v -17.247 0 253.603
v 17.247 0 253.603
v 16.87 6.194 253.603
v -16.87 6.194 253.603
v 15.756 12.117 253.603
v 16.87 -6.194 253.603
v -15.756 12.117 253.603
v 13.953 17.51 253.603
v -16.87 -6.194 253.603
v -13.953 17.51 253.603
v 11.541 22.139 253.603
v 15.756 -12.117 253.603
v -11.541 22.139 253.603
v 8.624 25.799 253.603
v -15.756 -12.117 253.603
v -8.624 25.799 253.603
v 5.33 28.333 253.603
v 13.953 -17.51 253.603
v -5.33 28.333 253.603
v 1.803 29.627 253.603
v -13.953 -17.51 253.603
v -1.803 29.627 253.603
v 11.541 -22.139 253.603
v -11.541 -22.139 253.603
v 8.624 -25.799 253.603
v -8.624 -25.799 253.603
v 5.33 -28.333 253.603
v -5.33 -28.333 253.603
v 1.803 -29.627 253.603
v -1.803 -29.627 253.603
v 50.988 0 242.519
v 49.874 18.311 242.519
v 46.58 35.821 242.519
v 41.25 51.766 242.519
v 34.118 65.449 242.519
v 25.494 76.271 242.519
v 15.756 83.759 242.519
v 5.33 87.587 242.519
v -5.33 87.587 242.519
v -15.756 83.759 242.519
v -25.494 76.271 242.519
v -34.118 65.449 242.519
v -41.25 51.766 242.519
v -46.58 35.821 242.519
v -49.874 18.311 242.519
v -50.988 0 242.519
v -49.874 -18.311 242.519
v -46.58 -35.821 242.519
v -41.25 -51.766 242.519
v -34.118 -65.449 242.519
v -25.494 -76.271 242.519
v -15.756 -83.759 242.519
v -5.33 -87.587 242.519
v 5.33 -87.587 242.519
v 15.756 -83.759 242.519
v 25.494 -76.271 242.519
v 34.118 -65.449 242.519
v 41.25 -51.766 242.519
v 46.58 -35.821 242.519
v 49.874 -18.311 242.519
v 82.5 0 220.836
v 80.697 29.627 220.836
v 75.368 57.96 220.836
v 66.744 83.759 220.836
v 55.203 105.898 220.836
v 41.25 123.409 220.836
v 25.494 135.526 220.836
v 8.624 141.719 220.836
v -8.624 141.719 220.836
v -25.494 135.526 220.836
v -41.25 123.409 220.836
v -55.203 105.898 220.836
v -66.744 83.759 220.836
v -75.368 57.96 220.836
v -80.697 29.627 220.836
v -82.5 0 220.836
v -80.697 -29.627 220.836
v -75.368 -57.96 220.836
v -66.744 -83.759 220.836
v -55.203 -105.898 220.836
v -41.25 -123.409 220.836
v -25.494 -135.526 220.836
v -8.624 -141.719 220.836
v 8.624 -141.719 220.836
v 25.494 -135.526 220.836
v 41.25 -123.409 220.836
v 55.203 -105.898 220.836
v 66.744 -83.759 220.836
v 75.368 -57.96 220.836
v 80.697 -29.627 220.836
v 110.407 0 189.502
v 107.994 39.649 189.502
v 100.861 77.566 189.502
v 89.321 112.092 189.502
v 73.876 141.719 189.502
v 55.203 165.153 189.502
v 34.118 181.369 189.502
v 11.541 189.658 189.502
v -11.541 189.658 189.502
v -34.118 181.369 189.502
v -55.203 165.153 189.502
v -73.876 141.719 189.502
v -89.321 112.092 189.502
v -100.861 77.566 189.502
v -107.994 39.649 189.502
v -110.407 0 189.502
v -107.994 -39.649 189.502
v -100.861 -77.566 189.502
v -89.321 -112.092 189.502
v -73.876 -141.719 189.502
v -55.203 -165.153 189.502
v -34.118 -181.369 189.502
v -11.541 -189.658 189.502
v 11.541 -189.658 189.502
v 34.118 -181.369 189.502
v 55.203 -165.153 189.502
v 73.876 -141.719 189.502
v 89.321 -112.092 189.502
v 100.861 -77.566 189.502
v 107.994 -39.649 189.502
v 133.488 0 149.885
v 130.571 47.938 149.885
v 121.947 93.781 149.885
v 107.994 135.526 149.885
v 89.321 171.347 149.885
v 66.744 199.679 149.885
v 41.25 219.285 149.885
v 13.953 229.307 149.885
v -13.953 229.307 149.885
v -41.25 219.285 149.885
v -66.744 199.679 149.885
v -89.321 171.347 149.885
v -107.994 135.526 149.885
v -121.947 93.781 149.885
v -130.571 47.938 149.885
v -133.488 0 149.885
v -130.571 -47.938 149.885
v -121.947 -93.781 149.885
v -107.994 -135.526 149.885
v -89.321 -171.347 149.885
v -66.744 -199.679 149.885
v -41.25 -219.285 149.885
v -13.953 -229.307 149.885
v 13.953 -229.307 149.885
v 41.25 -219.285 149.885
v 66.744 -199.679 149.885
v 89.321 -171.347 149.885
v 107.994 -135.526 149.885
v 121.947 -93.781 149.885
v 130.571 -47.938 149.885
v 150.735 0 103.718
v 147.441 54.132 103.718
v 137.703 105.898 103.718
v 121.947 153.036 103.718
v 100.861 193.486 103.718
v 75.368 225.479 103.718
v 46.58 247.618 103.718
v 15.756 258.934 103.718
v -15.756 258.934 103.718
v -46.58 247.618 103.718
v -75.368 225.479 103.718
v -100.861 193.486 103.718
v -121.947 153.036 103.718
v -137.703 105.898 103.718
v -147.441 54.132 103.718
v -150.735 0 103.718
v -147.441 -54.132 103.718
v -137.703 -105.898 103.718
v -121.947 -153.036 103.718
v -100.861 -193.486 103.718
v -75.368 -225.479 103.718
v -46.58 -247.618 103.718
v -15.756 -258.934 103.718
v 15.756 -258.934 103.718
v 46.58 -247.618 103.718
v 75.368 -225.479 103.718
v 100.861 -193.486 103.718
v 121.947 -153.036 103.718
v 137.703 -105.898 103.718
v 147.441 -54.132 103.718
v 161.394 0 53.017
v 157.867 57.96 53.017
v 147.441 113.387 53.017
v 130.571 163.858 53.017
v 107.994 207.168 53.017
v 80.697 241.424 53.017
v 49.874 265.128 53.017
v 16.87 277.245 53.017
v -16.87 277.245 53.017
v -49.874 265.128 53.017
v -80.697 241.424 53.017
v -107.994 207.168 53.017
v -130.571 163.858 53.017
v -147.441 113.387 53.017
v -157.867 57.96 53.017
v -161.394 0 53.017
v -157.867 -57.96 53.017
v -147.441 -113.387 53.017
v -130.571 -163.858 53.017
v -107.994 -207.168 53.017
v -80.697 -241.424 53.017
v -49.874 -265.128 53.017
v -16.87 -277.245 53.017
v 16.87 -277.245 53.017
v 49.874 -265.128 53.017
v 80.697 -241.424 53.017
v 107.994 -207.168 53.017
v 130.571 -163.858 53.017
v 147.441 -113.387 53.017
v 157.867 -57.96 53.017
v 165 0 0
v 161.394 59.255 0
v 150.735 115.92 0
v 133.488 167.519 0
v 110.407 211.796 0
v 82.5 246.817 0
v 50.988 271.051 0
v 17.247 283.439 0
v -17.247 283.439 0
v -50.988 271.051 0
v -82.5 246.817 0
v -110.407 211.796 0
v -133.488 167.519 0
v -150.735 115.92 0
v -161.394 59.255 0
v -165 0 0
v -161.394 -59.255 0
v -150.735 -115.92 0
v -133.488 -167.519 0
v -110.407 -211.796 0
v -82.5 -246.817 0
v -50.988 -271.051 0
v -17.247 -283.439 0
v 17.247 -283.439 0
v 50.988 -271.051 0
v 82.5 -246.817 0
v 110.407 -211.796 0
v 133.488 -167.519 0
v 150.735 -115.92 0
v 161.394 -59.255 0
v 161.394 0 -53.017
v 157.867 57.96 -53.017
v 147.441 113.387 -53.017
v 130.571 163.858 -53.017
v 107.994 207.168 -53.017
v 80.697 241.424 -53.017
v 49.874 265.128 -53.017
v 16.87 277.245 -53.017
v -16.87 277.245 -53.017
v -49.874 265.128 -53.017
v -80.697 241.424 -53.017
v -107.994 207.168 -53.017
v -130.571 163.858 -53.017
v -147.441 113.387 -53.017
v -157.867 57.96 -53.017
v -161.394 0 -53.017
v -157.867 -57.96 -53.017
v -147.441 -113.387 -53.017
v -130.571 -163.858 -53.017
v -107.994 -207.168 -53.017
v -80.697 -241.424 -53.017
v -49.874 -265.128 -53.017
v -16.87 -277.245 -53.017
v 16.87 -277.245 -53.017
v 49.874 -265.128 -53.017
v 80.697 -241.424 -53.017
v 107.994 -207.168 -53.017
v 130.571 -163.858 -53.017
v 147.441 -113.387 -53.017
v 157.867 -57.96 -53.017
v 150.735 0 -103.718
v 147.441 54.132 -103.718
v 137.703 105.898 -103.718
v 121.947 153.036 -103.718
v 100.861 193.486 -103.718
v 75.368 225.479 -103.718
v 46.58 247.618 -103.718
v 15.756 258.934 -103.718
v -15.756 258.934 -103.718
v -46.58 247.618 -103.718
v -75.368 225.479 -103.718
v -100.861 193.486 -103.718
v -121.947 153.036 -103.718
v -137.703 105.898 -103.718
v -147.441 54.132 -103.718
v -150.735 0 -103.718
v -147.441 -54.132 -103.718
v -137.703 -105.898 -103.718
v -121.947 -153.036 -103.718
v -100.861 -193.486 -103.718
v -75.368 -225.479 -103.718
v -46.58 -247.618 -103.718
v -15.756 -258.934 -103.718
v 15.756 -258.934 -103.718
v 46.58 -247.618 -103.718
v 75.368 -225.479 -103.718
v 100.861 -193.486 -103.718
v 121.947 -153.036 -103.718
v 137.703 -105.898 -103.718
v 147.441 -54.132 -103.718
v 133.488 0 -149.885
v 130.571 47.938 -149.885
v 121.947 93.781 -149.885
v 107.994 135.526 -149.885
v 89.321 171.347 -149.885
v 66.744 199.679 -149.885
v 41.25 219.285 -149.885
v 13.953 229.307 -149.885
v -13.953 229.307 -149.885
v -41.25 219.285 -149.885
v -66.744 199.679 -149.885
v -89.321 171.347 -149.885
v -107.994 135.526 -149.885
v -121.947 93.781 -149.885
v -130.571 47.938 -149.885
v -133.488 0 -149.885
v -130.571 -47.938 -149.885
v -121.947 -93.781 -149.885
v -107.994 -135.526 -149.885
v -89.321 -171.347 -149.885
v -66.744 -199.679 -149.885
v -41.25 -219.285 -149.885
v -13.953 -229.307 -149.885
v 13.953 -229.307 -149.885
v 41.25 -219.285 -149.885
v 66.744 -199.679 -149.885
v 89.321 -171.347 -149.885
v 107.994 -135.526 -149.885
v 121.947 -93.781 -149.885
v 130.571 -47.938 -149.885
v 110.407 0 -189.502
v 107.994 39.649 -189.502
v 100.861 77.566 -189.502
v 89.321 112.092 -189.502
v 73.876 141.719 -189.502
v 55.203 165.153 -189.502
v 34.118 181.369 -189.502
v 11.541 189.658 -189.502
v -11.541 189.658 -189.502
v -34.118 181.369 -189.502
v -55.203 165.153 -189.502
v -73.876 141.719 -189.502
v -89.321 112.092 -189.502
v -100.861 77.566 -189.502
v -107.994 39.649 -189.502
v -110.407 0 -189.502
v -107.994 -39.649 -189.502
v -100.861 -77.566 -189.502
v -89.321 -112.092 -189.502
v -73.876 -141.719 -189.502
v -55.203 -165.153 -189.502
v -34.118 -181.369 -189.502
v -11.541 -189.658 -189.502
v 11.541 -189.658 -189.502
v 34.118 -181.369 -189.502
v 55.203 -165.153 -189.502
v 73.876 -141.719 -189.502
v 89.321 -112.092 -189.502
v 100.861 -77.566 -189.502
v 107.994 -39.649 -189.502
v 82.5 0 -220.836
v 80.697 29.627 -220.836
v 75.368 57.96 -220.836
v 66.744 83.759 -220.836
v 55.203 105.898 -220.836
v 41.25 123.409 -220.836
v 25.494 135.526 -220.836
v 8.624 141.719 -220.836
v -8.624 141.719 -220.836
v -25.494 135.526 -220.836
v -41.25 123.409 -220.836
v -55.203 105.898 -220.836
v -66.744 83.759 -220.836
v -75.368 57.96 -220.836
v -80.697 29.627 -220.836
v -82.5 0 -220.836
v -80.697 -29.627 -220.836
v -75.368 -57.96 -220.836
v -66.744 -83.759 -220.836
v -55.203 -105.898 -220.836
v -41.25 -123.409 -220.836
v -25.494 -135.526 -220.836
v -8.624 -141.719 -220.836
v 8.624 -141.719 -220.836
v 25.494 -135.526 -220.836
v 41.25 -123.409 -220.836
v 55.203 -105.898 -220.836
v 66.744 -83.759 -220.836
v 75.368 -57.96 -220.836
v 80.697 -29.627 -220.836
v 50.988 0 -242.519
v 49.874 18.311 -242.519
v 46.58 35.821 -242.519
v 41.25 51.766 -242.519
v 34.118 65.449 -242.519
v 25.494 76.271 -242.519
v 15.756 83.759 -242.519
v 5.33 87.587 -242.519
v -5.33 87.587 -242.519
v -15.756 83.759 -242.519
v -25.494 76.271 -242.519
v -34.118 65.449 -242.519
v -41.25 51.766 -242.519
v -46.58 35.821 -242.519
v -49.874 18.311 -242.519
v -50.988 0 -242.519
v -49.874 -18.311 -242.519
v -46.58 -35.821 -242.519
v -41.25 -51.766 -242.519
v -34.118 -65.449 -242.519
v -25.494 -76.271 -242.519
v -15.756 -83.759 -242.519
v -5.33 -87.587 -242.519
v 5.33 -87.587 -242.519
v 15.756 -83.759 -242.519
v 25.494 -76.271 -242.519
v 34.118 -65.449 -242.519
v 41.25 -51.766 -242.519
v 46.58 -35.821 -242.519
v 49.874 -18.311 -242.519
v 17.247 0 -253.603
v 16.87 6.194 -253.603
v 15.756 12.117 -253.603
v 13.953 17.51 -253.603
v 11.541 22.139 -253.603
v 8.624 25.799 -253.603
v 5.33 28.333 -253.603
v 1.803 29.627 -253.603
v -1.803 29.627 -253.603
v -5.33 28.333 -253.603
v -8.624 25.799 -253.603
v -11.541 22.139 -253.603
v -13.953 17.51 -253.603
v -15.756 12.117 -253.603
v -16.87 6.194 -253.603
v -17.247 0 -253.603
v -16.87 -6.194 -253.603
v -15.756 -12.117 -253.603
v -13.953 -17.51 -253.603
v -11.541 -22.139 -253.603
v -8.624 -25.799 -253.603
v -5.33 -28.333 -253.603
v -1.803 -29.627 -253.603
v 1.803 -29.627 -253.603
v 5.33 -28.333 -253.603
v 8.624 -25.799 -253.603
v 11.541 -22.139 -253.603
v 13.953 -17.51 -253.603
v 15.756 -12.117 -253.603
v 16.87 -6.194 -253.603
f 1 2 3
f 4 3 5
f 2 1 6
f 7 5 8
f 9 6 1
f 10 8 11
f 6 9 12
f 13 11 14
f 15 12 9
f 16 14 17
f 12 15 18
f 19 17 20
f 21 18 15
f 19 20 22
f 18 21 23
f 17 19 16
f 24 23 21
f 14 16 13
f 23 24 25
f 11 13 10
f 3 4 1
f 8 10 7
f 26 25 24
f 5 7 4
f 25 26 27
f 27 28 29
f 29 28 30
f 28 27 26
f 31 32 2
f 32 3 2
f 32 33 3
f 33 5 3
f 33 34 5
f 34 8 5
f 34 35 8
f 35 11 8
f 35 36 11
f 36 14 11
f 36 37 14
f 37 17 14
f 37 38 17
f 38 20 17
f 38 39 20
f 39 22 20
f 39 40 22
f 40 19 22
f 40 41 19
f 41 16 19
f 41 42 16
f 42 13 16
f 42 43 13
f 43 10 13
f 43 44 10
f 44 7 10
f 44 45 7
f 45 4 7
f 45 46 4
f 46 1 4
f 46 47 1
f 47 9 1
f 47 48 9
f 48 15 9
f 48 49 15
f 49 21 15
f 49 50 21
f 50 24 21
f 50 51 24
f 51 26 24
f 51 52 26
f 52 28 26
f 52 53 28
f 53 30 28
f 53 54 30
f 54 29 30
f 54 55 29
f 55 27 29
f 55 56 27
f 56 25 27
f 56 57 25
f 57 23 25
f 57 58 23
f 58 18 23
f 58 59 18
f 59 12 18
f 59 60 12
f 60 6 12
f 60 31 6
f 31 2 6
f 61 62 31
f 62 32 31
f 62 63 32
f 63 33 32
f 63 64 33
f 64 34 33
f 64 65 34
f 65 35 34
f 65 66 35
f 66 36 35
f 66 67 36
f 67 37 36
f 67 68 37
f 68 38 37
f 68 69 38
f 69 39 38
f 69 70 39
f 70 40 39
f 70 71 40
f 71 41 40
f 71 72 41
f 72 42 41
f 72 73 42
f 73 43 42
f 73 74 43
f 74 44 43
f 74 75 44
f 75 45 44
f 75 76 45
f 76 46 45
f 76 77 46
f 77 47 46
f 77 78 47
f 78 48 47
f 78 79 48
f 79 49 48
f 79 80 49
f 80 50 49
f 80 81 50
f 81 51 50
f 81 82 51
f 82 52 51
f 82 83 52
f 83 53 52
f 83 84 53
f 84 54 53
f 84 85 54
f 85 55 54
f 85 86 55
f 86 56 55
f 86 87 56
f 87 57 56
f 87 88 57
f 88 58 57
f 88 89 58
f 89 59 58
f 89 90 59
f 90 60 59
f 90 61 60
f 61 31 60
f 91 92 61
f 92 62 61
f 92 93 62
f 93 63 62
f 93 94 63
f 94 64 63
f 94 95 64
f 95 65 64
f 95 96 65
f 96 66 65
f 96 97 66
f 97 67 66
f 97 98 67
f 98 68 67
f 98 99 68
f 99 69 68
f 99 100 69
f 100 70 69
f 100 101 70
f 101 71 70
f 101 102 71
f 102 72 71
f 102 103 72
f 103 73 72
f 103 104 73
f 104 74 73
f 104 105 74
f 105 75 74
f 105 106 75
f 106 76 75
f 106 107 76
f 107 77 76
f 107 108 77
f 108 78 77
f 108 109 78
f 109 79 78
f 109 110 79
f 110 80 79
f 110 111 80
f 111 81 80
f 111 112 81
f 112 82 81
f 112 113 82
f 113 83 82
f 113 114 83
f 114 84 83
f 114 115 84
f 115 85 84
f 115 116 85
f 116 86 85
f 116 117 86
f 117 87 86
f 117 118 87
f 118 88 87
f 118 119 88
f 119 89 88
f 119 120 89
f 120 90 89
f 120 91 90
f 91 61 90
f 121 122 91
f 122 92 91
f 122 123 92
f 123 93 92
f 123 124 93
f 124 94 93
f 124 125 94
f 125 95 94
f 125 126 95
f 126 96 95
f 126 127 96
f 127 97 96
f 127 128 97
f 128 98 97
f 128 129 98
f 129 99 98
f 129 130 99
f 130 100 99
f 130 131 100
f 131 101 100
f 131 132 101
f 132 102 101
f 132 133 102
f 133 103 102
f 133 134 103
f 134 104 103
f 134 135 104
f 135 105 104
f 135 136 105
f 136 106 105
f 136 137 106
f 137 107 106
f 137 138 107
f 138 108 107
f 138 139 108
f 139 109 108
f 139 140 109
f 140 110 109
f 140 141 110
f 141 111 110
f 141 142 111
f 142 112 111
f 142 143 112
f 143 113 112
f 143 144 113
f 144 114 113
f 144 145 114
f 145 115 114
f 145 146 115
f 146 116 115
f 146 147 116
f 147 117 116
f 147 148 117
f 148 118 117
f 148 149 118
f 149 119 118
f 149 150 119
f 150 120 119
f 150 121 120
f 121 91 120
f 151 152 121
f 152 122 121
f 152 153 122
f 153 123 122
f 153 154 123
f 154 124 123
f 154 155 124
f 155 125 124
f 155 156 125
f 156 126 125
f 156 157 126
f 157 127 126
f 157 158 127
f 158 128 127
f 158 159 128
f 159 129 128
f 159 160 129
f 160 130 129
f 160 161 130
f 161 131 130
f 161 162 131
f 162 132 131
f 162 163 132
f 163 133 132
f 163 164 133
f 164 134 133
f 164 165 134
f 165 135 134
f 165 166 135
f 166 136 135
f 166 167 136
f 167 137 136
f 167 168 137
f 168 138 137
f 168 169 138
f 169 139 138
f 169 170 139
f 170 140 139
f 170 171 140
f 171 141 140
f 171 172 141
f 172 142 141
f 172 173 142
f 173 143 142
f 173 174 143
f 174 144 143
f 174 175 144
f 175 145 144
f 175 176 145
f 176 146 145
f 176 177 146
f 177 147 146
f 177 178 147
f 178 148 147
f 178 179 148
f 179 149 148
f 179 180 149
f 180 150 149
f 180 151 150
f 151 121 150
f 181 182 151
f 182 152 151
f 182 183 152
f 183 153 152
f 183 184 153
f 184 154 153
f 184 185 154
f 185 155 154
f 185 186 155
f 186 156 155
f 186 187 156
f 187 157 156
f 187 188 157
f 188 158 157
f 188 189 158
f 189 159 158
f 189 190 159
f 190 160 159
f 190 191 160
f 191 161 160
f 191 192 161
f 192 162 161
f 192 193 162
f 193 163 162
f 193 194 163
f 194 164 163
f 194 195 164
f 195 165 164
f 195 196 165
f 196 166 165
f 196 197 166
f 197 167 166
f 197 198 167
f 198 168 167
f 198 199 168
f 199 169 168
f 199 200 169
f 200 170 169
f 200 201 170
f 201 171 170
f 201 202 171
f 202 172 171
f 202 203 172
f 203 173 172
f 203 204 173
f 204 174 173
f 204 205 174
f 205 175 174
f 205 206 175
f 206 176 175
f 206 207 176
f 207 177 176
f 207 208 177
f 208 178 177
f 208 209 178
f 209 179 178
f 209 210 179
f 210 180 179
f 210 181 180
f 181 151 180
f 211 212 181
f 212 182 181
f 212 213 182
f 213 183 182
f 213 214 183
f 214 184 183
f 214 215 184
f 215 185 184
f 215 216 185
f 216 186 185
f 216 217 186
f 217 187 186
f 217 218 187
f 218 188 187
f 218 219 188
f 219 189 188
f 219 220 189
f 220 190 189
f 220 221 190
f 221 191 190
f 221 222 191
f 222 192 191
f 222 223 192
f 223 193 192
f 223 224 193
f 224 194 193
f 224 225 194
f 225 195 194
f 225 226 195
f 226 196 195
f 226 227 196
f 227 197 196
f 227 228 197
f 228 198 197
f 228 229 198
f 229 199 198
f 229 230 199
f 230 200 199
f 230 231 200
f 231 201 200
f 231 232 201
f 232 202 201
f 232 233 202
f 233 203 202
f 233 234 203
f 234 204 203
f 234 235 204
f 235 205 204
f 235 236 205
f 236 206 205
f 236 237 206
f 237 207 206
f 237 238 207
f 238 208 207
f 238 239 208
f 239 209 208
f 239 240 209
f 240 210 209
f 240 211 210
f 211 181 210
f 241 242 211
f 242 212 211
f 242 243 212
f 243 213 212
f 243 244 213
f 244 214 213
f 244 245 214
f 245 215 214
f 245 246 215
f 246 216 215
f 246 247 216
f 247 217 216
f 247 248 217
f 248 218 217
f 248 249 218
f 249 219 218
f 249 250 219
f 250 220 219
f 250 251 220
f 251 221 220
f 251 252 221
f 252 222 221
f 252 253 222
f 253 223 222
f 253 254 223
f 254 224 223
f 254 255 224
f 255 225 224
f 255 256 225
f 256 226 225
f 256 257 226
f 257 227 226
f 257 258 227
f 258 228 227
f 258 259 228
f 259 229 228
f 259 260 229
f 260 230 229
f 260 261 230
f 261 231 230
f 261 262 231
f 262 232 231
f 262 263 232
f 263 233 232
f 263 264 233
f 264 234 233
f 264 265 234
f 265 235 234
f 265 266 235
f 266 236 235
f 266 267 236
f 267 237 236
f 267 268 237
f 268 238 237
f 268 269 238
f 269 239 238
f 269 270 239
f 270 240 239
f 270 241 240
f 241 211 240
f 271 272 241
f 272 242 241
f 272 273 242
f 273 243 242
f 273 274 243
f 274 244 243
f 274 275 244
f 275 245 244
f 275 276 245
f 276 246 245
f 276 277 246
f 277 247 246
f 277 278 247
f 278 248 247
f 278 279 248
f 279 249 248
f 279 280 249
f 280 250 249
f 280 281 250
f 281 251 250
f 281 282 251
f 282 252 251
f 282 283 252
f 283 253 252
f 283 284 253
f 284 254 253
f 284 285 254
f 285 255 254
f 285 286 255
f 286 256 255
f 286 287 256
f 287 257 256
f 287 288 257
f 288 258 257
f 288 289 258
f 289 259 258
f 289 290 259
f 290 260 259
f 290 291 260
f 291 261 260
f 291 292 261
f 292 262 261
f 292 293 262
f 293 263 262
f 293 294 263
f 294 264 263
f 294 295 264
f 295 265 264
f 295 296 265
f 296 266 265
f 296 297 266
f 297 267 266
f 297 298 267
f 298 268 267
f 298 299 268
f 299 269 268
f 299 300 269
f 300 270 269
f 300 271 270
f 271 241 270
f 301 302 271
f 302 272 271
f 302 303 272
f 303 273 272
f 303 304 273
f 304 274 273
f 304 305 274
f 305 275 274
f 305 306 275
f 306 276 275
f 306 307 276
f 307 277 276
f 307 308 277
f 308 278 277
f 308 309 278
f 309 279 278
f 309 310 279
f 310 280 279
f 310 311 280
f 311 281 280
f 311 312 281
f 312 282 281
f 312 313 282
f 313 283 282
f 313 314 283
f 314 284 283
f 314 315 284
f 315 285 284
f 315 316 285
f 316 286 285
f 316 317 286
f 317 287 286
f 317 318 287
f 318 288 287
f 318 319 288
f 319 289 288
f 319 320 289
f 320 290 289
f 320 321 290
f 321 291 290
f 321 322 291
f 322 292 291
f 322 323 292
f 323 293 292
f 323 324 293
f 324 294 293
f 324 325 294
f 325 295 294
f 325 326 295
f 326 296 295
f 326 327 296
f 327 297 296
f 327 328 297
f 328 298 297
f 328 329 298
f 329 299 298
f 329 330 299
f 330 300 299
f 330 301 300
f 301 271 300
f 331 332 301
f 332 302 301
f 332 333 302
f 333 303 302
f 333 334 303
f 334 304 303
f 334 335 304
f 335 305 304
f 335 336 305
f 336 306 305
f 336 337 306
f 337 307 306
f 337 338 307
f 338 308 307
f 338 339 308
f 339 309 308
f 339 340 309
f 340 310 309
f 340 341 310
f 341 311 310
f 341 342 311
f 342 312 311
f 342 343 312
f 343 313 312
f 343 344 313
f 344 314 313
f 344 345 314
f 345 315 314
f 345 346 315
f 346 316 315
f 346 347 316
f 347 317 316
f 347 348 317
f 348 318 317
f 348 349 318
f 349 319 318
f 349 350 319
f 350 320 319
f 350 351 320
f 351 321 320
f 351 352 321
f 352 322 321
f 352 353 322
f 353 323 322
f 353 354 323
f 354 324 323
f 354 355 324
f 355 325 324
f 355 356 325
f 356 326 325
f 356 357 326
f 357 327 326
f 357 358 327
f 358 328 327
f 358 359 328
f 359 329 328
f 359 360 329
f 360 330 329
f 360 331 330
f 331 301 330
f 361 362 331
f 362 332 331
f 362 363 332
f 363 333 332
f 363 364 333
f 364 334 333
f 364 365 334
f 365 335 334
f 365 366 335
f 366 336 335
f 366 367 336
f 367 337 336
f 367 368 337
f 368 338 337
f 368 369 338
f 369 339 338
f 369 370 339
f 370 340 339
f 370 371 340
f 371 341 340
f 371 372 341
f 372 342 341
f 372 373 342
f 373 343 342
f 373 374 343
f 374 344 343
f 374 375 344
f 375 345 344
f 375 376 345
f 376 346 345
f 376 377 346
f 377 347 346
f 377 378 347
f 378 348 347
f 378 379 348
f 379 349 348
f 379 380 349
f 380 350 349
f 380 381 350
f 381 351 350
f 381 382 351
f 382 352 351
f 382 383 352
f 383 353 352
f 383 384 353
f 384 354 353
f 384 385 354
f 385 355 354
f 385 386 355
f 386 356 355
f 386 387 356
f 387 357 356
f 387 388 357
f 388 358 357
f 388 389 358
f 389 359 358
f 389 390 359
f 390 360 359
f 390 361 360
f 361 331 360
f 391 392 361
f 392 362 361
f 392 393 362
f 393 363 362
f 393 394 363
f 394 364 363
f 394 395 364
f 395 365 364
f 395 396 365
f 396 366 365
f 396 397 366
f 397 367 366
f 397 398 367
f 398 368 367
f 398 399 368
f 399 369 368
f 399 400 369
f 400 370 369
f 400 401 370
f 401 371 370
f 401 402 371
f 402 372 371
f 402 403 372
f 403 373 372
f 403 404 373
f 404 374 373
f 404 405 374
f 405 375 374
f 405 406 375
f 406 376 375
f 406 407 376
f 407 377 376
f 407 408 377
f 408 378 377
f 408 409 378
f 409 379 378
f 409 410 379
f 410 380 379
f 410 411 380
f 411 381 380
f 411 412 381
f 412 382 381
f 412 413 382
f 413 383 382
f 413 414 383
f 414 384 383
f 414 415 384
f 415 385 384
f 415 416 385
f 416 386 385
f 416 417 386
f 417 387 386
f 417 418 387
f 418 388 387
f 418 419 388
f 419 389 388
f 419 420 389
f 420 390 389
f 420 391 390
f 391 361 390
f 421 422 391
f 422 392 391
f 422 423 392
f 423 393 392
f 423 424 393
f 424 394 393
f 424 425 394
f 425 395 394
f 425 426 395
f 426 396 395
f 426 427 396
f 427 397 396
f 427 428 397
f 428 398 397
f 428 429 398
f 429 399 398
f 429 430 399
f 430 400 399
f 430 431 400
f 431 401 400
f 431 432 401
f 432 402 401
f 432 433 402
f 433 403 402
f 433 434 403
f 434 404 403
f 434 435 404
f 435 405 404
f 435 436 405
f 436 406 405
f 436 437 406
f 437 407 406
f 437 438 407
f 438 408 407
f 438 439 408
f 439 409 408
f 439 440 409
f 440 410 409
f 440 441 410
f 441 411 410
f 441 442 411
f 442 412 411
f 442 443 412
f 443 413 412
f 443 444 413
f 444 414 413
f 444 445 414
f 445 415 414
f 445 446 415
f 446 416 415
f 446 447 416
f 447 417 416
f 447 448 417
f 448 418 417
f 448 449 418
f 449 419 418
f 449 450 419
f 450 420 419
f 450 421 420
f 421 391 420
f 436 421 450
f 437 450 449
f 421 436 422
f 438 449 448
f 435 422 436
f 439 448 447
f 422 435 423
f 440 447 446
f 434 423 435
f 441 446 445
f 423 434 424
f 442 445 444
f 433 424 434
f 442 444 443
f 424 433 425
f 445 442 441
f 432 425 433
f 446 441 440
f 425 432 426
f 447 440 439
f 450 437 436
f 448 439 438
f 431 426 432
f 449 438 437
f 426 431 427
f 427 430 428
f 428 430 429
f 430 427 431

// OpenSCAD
// Generated by SolidPython 1.0.1 on 2020-07-29 00:46:50


scale(v = [11, 19, 17]) {
	sphere(r = 15);
}
/***********************************************
*********      SolidPython code:      **********
************************************************
 
# import packages: SolidPython
from solid import *
from solid.utils import *
from itertools import chain, combinations, permutations


class Resize:

    def __init__(self, scad_file):
        self.scad_file = scad_file
        #self.scad_file = import_scad(scad_file)
        # cone/cylinder param:
        self.r1 = 0
        self.r2 = 0
        self.h = 0
        # rectangular prism param:
        self.w = 0
        self.l = 0
        # ellipse param:
        self.r = 0

    # import OpenScad code (file name corresponds to shape)


    # classify shape + parameters
    def assign(self, param1, param2, param3):
        if self.scad_file == 'cone.scad':
            self.r1 = param1
            self.r2 = param2
            self.h = param3
        elif self.scad_file == 'cylinder.scad':
            self.r1 = param1
            self.r2 = param2
            self.h = param3
        elif self.scad_file == 'rectangularPrism.scad':
            self.h = param1
            self.l = param2
            self.w = param3
        else:
            self.r = param1
            self.h = param2

    # resize parameters
    def iterate(self):
        x = range(3, 20, 2)
        i = 1
        if self.scad_file == 'cone.scad':
            tempList = list(permutations(x, 2))
            for temp in tempList:
                param1 = temp[0]
                param2 = temp[1]
                filepath = 'produced_scad_files/' + 'cone' + str(param1) + '_' + str(param2) + '_' + '.scad'
                scad_render_to_file(cylinder(h=param1, r1=param2, r2=0), filepath)

        elif self.scad_file == 'cylinder.scad':
            tempList = list(permutations(x, 3))
            for temp in tempList:
                param1 = temp[0]
                param2 = temp[1]
                filepath = 'produced_scad_files/' + 'cylinder' + str(param1) + '_' + str(param2) + '_' + '.scad'
                scad_render_to_file(cylinder(h=param1, r1=param2, r2=param2), filepath)

        elif self.scad_file == 'rectangularPrism.scad':
            tempList = list(permutations(x, 3))
            for temp in tempList:
                param1 = temp[0]
                param2 = temp[1]
                param3 = temp[2]
                filepath = 'produced_scad_files/' + 'rectangularPrism' + str(param1) + '_' + str(param2) + '_' + str(
                    param3) + '.scad'
                scad_render_to_file(cube(size=(param1, param2, param3)), filepath)

        elif self.scad_file == 'ellipse.scad':
            tempList = list(permutations(x, 4))
            for temp in tempList:
                param1 = temp[0]
                param2 = temp[1]
                param3 = temp[2]
                param4 = temp[3]
                filepath = 'produced_scad_files/' + 'ellipse' + str(param1) + '_' + str(param2) + '_' + str(param3) + '_' + str(param4) + '.scad'
                scad_render_to_file(scale([param1, param2, param3])(sphere(r=param4)), filepath)

    def render_to_scadfile(self):
        scad_render_to_file(scad, 'example.scad') 
 
************************************************/
